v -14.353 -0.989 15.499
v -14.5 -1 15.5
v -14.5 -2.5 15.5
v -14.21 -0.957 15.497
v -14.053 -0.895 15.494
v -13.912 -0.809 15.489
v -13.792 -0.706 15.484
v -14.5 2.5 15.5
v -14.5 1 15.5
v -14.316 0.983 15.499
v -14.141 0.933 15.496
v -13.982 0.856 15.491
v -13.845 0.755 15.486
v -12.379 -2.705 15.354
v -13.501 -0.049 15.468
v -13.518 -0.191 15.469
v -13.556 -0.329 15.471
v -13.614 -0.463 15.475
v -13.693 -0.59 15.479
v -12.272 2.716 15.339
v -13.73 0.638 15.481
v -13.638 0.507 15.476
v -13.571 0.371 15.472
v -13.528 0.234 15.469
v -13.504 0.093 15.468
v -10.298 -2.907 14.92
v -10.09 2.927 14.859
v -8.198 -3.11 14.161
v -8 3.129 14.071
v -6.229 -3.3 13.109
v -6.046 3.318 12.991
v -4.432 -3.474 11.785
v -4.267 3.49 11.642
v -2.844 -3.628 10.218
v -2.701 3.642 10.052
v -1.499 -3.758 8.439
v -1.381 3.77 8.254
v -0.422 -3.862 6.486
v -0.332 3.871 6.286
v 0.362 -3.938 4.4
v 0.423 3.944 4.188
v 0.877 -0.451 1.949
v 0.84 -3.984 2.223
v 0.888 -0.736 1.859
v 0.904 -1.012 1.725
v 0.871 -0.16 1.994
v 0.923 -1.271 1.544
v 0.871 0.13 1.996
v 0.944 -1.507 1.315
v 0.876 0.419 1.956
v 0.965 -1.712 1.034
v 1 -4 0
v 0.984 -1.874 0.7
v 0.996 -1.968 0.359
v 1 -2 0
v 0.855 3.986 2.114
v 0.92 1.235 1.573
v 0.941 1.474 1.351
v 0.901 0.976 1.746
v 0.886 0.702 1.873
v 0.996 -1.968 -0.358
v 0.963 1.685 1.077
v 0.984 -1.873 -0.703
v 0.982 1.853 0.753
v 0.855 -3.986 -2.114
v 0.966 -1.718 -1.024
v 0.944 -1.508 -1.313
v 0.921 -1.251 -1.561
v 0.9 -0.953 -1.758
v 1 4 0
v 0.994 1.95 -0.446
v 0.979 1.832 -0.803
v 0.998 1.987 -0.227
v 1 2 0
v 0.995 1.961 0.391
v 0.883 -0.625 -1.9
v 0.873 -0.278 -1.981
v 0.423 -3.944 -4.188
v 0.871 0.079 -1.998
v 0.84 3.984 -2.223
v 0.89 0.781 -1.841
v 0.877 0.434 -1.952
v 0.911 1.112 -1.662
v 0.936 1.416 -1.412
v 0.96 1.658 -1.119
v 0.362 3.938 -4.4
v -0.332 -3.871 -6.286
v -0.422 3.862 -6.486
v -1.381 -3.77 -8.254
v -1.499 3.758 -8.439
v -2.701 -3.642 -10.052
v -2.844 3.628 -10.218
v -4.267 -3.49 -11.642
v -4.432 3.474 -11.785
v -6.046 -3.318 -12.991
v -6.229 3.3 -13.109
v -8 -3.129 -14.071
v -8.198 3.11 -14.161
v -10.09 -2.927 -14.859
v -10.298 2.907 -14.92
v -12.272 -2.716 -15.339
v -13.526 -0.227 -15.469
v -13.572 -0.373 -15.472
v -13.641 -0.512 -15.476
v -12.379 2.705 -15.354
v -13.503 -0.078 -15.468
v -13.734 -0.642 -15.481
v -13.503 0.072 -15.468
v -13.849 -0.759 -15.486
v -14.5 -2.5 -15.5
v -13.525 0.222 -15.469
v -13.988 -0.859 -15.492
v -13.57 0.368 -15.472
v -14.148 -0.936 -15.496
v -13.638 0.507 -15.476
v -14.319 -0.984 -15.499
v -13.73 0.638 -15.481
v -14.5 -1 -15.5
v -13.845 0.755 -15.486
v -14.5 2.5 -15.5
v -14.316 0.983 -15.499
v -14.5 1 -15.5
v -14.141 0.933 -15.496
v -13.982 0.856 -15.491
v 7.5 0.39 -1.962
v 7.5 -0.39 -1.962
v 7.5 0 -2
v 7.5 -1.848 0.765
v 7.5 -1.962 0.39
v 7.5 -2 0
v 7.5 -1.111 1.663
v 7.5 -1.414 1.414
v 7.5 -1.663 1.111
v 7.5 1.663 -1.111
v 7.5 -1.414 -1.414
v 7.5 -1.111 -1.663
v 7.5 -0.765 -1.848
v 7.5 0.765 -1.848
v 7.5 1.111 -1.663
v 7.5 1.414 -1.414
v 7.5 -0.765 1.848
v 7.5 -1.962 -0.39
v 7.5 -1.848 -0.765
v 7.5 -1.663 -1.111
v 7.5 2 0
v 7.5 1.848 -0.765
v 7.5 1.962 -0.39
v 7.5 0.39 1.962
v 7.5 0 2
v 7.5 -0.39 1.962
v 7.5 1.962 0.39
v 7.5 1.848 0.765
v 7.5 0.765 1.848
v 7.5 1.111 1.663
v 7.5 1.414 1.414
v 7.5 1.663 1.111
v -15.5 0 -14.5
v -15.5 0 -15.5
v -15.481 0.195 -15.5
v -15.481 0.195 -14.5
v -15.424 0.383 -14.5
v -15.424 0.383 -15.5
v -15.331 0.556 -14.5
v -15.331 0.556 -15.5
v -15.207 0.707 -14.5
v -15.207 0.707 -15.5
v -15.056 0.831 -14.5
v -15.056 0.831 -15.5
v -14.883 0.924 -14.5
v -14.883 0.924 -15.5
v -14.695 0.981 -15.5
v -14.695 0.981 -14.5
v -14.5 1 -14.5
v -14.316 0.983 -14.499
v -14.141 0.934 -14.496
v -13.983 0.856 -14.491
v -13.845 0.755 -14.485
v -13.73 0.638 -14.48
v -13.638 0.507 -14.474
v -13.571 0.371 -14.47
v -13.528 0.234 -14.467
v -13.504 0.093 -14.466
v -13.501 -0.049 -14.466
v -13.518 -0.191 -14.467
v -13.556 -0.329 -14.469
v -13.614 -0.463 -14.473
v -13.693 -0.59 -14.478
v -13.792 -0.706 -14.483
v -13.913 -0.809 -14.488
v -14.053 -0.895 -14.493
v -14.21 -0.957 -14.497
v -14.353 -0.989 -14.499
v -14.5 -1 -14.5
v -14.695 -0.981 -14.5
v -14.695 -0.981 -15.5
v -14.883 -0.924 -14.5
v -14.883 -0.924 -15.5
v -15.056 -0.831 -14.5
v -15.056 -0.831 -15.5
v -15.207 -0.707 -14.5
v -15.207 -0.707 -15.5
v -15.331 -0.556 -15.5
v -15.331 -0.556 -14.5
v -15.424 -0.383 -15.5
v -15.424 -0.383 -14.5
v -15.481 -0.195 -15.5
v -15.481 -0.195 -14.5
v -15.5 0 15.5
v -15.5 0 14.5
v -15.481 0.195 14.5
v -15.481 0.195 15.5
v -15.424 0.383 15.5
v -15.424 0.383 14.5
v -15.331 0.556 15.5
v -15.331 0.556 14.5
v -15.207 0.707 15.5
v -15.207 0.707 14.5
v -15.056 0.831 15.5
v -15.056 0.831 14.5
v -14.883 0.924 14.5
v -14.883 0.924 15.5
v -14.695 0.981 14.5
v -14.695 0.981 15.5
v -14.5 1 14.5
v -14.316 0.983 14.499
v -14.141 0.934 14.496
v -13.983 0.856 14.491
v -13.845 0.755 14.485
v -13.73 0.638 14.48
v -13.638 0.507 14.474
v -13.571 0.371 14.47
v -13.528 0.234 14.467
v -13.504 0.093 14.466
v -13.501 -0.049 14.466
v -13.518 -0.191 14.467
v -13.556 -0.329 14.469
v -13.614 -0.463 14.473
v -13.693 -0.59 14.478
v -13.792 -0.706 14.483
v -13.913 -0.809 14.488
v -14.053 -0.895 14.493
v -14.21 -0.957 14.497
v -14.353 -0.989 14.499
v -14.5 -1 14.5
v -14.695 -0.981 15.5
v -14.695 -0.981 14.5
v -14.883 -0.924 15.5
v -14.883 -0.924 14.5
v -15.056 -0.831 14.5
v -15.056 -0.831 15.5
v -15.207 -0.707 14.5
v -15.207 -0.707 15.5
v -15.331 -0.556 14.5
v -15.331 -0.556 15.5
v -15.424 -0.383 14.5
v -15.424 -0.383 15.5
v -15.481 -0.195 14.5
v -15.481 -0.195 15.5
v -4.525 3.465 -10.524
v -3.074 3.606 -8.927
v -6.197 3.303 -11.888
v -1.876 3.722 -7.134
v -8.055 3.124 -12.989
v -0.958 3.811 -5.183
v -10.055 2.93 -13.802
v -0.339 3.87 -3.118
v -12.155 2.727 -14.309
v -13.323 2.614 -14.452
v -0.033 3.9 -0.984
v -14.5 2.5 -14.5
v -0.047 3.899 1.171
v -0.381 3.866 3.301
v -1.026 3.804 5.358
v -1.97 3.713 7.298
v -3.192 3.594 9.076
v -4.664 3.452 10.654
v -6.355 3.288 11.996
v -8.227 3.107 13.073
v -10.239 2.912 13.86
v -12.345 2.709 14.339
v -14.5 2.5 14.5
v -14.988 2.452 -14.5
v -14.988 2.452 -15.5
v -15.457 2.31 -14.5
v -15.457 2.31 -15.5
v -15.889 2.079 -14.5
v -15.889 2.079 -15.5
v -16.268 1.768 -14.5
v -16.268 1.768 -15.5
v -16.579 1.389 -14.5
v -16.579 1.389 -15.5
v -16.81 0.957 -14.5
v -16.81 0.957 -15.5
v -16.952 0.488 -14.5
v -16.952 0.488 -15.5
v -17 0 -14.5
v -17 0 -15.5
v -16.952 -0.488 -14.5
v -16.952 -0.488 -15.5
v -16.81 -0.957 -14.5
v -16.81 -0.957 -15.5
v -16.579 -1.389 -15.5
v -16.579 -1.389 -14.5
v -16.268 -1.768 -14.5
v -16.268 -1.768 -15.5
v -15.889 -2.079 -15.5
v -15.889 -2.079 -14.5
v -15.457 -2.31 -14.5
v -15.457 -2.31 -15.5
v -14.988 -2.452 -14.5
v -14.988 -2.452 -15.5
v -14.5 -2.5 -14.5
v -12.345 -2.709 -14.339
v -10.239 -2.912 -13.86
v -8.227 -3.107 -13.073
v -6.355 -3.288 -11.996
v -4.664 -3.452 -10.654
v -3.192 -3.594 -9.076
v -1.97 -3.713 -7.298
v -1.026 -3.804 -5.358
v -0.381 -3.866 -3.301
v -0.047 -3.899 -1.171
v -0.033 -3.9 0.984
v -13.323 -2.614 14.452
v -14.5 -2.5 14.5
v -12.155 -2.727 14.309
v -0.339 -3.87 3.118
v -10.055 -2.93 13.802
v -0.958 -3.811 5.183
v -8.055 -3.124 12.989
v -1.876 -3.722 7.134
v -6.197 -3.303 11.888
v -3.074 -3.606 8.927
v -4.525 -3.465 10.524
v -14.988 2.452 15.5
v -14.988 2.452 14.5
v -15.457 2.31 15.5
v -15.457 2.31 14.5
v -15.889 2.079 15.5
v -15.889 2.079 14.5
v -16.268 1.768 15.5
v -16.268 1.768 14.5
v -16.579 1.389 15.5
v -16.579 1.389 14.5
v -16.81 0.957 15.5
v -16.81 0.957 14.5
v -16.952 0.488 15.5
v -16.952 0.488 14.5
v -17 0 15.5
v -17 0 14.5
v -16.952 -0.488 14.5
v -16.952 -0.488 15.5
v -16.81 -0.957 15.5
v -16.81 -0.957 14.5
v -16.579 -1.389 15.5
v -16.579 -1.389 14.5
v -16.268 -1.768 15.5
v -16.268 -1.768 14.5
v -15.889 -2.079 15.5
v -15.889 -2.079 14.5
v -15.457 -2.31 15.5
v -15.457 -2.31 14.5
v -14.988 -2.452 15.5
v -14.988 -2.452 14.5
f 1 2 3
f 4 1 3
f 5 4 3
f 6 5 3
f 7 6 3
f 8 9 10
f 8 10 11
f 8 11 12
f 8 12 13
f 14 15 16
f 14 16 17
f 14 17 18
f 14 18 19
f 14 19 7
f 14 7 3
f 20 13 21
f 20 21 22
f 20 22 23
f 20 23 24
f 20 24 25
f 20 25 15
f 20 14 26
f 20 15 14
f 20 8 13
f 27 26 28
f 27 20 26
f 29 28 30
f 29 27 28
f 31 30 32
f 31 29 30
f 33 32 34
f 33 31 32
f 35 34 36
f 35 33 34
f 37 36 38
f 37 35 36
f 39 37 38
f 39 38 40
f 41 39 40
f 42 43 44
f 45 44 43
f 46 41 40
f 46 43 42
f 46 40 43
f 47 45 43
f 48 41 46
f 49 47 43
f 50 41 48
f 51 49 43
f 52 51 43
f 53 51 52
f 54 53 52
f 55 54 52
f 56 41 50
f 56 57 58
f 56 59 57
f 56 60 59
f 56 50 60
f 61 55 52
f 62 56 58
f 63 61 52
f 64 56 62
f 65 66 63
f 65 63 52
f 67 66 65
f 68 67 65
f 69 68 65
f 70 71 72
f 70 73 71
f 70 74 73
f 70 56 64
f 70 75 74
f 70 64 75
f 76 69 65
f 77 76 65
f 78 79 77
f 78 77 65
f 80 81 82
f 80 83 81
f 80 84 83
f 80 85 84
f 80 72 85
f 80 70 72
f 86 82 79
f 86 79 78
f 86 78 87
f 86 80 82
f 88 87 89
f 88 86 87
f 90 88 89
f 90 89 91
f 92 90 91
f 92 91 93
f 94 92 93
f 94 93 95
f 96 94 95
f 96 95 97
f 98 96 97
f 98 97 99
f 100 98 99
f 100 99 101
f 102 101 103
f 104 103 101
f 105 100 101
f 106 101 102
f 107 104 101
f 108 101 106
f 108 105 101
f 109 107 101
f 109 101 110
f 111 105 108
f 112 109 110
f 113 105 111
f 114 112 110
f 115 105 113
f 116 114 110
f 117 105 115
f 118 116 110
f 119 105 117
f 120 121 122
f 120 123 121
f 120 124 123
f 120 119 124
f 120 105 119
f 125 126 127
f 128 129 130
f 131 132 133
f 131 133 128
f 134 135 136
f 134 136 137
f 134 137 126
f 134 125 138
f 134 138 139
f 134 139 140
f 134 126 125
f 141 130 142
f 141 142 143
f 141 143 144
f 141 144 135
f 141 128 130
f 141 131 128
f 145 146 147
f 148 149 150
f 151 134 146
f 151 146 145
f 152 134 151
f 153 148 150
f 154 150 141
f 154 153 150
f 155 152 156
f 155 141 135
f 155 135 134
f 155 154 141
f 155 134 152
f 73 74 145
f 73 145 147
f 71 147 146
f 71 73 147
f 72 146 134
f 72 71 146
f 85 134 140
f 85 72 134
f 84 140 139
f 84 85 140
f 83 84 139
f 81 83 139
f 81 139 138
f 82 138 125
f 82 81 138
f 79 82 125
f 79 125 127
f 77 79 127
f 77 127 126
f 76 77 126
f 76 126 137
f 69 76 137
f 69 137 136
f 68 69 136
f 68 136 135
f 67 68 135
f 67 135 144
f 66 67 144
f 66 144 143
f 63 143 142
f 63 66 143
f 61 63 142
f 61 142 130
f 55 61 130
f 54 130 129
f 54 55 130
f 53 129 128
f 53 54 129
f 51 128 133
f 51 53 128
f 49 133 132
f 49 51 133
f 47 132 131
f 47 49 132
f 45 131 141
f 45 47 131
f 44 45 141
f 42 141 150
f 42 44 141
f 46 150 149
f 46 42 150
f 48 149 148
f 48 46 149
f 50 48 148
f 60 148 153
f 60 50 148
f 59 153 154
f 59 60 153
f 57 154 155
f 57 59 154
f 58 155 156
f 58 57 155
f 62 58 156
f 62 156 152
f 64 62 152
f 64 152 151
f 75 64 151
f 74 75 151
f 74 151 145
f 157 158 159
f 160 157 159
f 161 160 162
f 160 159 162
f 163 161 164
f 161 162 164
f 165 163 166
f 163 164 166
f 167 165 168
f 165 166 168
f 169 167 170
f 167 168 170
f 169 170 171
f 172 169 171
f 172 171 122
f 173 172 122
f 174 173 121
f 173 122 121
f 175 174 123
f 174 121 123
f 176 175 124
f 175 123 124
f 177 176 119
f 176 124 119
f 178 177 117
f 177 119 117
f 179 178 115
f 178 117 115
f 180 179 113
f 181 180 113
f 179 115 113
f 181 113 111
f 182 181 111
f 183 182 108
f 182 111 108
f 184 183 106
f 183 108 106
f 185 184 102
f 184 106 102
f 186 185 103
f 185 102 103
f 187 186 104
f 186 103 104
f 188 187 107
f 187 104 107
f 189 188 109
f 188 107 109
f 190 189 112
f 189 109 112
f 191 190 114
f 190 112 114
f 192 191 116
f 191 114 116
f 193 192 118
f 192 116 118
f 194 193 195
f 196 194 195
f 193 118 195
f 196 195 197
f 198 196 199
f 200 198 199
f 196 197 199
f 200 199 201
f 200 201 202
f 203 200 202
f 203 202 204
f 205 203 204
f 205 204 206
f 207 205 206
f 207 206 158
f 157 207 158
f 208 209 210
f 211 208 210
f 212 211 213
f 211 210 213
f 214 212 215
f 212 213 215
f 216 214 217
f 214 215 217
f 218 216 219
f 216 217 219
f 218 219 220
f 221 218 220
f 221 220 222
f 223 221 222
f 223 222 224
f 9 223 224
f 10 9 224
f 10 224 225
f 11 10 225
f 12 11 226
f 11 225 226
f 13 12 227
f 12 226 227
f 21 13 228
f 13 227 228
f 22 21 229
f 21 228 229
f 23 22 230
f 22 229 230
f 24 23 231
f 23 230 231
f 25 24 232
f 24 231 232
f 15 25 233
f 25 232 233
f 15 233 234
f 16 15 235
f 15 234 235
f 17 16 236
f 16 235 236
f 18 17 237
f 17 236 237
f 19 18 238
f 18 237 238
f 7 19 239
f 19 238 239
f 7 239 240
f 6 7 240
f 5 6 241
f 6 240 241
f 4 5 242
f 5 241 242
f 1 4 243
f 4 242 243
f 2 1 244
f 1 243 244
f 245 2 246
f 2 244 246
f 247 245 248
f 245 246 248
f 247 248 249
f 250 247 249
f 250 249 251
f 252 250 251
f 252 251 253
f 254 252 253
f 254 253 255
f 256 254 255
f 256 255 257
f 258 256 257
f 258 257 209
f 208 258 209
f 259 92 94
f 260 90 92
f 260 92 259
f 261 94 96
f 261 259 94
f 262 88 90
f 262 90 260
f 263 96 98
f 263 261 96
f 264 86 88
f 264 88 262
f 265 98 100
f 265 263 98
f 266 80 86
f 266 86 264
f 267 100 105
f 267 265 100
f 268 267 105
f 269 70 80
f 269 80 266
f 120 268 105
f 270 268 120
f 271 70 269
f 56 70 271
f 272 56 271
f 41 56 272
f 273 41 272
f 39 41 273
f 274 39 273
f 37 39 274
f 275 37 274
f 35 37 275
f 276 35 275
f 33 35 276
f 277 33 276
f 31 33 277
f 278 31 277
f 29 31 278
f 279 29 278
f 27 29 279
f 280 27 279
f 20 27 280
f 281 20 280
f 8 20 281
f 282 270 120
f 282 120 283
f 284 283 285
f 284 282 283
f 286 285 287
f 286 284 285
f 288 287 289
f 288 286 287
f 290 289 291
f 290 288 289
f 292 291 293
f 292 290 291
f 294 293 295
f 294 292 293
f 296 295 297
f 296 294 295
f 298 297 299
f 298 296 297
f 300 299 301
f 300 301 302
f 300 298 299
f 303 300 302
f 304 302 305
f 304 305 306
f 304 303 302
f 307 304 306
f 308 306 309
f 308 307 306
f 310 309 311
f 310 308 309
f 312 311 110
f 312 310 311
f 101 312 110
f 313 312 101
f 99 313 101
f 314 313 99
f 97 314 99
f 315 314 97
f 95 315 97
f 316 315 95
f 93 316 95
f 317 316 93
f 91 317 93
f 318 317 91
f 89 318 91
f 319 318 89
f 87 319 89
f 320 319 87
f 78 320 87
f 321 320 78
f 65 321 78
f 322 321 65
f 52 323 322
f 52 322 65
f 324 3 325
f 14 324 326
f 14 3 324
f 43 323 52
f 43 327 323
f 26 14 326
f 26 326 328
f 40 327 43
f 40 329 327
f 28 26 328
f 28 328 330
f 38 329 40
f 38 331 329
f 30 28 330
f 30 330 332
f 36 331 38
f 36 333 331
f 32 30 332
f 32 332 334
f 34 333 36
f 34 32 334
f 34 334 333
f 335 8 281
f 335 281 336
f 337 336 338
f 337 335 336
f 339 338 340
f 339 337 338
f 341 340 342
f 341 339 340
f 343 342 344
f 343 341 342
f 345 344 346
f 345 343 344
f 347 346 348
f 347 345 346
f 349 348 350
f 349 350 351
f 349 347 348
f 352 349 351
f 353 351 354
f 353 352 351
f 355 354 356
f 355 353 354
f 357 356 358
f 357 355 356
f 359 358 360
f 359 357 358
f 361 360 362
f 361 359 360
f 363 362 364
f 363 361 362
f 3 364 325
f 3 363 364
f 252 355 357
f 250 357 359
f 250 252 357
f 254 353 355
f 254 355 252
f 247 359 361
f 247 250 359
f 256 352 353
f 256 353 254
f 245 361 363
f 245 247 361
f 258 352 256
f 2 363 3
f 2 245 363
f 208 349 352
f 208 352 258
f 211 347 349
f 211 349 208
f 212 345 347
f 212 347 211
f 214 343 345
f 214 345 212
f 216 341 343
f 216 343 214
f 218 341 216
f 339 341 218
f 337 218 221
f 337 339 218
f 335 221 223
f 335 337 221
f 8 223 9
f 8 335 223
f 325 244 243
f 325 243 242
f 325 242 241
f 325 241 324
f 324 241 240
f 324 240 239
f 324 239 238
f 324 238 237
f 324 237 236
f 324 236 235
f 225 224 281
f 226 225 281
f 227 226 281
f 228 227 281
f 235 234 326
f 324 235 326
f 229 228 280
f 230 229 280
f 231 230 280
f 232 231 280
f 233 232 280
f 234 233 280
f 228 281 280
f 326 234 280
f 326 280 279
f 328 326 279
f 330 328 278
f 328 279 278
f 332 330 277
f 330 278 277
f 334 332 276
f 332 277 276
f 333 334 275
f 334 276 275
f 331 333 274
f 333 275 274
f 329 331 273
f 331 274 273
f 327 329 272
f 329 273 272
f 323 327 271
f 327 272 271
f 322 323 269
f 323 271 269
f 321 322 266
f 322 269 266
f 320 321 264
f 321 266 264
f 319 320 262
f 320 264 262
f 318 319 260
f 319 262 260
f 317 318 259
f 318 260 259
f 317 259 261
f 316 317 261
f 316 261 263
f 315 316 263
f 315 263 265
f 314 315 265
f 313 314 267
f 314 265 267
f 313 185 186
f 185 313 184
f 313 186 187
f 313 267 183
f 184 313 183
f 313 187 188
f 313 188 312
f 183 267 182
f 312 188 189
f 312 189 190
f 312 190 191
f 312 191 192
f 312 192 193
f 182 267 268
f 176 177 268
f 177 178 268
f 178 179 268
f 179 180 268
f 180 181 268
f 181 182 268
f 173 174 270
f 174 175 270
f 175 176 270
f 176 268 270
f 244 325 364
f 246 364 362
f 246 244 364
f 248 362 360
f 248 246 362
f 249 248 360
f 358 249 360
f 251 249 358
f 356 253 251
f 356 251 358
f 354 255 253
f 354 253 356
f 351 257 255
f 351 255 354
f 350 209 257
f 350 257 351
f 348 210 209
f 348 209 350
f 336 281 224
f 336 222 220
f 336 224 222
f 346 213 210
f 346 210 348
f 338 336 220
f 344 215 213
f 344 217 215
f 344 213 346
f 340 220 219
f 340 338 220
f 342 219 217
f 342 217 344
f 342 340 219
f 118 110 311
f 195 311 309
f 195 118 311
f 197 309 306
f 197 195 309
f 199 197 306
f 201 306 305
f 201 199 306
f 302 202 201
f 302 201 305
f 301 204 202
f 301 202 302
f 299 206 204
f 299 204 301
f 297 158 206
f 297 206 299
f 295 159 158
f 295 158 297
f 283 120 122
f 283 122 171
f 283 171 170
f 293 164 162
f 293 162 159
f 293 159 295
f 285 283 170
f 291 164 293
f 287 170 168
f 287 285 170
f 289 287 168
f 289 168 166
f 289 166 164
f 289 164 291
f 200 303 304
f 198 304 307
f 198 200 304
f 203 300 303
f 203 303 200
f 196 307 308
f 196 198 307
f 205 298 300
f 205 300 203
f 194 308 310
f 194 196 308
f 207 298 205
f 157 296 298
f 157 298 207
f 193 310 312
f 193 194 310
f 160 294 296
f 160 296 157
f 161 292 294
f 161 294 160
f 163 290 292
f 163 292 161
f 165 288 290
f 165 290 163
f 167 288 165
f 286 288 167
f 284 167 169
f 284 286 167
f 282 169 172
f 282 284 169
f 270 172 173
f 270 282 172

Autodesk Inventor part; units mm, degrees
ref_plane "YZ Plane" through (0, 0, 0) normal (1, 0, 0) x (0, 1, 0)
ref_plane "XY Plane" through (0, 0, 0) normal (0, 0, 1) x (1, 0, 0)
sketch "Sketch1" plane through (0, 0, 0) normal (1, 0, 0) x (0, 1, 0)
  circle A0 centre (0, 0) radius 2
  dimension "d0" = 4
extrude "Extrusion1" add sketch "Sketch1" along normal blind 7.5
ref_plane "Work Plane1" through (0, 2, 0) normal (0, 1, 0) x (-1, 0, 0)
sketch "Sketch2" plane through (0, 2, 0) normal (0, 1, 0) x (-1, 0, 0)
  arc A0 (14.5, 14.5) -> (14.5, -14.5) centre (14.5, 0) ccw
  arc A1 (14.5, 15.5) -> (14.5, -15.5) centre (14.5, 0) ccw
  line L0 (14.5, 15.5) -> (14.5, 14.5)
  line L1 (14.5, -14.5) -> (14.5, -15.5)
  point P0 (0, 0)
  dimension "d5" = 31
extrude "Extrusion2" add sketch "Sketch2" against normal blind 4
sketch "Sketch3" plane through (0, 2, 0) normal (0, 1, 0) x (1, 0, 0)
  point P0 (-14.5, -14.5)
  point P1 (-14.5, 14.5)
  point P2 (-14.5, 0)
  point P3 (-14.5, -15.5)
ref_plane "Work Plane2" through (0, 4, 0) normal (0, 1, 0) x (-1, 0, 0)
sketch "Sketch4" plane through (0, 4, 0) normal (0, 1, 0) x (-1, 0, 0)
  arc A0 (14.5, 15.5) -> (-1, 0) centre (14.5, 0) ccw projected
  arc A1 (14.5, 15.5) -> (14.5, -15.5) centre (14.5, 0) ccw
  arc A2 (14.5, 14.5) -> (14.5, -14.5) centre (14.5, 0) ccw
  line L0 (14.5, 15.5) -> (14.5, 14.5)
  arc A3 (14.5, 14.5) -> (14.5, -14.5) centre (14.5, 0) ccw projected
  line L1 (14.5, -14.5) -> (14.5, -15.5)
  line L2 (14.5, 14.5) -> (17.5, 14.5)
  line L3 (17.5, 14.5) -> (17.5, 15.5)
  line L4 (17.5, 15.5) -> (14.5, 15.5)
  line L5 (14.5, -15.5) -> (17.5, -15.5)
  line L6 (17.5, -15.5) -> (17.5, -14.5)
  line L7 (17.5, -14.5) -> (14.5, -14.5)
  point P0 (0, 0)
  dimension "d10" = 3
  dimension "d11" = 1
  dimension "d12" = 3
extrude "Extrusion3" add sketch "Sketch4" against normal blind 8
sketch "Sketch5" plane through (-17.5, 4, 15.5) normal (0, 0, 1) x (1, 0, 0)
  line L0 (3, 0) -> (3, -8) projected
  circle A0 centre (3, -4) radius 2.5
  line L1 (3, -8) -> (18.5, -8) projected
  line L2 (3, -6.5) -> (18.5, -8)
  line L3 (18.5, -8) -> (-0.017, -8)
  line L4 (-0.017, -8) -> (-0.017, 0)
  line L5 (-0.017, 0) -> (18.5, 0)
  line L6 (18.5, 0) -> (18.5, -8) projected
  line L7 (18.5, 0) -> (3, -1.5)
  point P0 (17.5, -4)
  dimension "d15" = 5
extrude "Extrusion4" cut sketch "Sketch5" against normal through all contours L5 L7 L0 | L0 A0 L3 L4 L5 | L2 L1 L0
sketch "Sketch6" plane through (-14.5, 0, -15.5) normal (0, 0, -1) x (-1, 0, 0)
  line L0 (0, 2.5) -> (0, -2.5) projected
  circle A0 centre (0, 0) radius 1
  point P0 (-14.5, 0)
  dimension "d18" = 2
extrude "Extrusion5" cut sketch "Sketch6" against normal through all
properties part number "Sujetador Espejo"
